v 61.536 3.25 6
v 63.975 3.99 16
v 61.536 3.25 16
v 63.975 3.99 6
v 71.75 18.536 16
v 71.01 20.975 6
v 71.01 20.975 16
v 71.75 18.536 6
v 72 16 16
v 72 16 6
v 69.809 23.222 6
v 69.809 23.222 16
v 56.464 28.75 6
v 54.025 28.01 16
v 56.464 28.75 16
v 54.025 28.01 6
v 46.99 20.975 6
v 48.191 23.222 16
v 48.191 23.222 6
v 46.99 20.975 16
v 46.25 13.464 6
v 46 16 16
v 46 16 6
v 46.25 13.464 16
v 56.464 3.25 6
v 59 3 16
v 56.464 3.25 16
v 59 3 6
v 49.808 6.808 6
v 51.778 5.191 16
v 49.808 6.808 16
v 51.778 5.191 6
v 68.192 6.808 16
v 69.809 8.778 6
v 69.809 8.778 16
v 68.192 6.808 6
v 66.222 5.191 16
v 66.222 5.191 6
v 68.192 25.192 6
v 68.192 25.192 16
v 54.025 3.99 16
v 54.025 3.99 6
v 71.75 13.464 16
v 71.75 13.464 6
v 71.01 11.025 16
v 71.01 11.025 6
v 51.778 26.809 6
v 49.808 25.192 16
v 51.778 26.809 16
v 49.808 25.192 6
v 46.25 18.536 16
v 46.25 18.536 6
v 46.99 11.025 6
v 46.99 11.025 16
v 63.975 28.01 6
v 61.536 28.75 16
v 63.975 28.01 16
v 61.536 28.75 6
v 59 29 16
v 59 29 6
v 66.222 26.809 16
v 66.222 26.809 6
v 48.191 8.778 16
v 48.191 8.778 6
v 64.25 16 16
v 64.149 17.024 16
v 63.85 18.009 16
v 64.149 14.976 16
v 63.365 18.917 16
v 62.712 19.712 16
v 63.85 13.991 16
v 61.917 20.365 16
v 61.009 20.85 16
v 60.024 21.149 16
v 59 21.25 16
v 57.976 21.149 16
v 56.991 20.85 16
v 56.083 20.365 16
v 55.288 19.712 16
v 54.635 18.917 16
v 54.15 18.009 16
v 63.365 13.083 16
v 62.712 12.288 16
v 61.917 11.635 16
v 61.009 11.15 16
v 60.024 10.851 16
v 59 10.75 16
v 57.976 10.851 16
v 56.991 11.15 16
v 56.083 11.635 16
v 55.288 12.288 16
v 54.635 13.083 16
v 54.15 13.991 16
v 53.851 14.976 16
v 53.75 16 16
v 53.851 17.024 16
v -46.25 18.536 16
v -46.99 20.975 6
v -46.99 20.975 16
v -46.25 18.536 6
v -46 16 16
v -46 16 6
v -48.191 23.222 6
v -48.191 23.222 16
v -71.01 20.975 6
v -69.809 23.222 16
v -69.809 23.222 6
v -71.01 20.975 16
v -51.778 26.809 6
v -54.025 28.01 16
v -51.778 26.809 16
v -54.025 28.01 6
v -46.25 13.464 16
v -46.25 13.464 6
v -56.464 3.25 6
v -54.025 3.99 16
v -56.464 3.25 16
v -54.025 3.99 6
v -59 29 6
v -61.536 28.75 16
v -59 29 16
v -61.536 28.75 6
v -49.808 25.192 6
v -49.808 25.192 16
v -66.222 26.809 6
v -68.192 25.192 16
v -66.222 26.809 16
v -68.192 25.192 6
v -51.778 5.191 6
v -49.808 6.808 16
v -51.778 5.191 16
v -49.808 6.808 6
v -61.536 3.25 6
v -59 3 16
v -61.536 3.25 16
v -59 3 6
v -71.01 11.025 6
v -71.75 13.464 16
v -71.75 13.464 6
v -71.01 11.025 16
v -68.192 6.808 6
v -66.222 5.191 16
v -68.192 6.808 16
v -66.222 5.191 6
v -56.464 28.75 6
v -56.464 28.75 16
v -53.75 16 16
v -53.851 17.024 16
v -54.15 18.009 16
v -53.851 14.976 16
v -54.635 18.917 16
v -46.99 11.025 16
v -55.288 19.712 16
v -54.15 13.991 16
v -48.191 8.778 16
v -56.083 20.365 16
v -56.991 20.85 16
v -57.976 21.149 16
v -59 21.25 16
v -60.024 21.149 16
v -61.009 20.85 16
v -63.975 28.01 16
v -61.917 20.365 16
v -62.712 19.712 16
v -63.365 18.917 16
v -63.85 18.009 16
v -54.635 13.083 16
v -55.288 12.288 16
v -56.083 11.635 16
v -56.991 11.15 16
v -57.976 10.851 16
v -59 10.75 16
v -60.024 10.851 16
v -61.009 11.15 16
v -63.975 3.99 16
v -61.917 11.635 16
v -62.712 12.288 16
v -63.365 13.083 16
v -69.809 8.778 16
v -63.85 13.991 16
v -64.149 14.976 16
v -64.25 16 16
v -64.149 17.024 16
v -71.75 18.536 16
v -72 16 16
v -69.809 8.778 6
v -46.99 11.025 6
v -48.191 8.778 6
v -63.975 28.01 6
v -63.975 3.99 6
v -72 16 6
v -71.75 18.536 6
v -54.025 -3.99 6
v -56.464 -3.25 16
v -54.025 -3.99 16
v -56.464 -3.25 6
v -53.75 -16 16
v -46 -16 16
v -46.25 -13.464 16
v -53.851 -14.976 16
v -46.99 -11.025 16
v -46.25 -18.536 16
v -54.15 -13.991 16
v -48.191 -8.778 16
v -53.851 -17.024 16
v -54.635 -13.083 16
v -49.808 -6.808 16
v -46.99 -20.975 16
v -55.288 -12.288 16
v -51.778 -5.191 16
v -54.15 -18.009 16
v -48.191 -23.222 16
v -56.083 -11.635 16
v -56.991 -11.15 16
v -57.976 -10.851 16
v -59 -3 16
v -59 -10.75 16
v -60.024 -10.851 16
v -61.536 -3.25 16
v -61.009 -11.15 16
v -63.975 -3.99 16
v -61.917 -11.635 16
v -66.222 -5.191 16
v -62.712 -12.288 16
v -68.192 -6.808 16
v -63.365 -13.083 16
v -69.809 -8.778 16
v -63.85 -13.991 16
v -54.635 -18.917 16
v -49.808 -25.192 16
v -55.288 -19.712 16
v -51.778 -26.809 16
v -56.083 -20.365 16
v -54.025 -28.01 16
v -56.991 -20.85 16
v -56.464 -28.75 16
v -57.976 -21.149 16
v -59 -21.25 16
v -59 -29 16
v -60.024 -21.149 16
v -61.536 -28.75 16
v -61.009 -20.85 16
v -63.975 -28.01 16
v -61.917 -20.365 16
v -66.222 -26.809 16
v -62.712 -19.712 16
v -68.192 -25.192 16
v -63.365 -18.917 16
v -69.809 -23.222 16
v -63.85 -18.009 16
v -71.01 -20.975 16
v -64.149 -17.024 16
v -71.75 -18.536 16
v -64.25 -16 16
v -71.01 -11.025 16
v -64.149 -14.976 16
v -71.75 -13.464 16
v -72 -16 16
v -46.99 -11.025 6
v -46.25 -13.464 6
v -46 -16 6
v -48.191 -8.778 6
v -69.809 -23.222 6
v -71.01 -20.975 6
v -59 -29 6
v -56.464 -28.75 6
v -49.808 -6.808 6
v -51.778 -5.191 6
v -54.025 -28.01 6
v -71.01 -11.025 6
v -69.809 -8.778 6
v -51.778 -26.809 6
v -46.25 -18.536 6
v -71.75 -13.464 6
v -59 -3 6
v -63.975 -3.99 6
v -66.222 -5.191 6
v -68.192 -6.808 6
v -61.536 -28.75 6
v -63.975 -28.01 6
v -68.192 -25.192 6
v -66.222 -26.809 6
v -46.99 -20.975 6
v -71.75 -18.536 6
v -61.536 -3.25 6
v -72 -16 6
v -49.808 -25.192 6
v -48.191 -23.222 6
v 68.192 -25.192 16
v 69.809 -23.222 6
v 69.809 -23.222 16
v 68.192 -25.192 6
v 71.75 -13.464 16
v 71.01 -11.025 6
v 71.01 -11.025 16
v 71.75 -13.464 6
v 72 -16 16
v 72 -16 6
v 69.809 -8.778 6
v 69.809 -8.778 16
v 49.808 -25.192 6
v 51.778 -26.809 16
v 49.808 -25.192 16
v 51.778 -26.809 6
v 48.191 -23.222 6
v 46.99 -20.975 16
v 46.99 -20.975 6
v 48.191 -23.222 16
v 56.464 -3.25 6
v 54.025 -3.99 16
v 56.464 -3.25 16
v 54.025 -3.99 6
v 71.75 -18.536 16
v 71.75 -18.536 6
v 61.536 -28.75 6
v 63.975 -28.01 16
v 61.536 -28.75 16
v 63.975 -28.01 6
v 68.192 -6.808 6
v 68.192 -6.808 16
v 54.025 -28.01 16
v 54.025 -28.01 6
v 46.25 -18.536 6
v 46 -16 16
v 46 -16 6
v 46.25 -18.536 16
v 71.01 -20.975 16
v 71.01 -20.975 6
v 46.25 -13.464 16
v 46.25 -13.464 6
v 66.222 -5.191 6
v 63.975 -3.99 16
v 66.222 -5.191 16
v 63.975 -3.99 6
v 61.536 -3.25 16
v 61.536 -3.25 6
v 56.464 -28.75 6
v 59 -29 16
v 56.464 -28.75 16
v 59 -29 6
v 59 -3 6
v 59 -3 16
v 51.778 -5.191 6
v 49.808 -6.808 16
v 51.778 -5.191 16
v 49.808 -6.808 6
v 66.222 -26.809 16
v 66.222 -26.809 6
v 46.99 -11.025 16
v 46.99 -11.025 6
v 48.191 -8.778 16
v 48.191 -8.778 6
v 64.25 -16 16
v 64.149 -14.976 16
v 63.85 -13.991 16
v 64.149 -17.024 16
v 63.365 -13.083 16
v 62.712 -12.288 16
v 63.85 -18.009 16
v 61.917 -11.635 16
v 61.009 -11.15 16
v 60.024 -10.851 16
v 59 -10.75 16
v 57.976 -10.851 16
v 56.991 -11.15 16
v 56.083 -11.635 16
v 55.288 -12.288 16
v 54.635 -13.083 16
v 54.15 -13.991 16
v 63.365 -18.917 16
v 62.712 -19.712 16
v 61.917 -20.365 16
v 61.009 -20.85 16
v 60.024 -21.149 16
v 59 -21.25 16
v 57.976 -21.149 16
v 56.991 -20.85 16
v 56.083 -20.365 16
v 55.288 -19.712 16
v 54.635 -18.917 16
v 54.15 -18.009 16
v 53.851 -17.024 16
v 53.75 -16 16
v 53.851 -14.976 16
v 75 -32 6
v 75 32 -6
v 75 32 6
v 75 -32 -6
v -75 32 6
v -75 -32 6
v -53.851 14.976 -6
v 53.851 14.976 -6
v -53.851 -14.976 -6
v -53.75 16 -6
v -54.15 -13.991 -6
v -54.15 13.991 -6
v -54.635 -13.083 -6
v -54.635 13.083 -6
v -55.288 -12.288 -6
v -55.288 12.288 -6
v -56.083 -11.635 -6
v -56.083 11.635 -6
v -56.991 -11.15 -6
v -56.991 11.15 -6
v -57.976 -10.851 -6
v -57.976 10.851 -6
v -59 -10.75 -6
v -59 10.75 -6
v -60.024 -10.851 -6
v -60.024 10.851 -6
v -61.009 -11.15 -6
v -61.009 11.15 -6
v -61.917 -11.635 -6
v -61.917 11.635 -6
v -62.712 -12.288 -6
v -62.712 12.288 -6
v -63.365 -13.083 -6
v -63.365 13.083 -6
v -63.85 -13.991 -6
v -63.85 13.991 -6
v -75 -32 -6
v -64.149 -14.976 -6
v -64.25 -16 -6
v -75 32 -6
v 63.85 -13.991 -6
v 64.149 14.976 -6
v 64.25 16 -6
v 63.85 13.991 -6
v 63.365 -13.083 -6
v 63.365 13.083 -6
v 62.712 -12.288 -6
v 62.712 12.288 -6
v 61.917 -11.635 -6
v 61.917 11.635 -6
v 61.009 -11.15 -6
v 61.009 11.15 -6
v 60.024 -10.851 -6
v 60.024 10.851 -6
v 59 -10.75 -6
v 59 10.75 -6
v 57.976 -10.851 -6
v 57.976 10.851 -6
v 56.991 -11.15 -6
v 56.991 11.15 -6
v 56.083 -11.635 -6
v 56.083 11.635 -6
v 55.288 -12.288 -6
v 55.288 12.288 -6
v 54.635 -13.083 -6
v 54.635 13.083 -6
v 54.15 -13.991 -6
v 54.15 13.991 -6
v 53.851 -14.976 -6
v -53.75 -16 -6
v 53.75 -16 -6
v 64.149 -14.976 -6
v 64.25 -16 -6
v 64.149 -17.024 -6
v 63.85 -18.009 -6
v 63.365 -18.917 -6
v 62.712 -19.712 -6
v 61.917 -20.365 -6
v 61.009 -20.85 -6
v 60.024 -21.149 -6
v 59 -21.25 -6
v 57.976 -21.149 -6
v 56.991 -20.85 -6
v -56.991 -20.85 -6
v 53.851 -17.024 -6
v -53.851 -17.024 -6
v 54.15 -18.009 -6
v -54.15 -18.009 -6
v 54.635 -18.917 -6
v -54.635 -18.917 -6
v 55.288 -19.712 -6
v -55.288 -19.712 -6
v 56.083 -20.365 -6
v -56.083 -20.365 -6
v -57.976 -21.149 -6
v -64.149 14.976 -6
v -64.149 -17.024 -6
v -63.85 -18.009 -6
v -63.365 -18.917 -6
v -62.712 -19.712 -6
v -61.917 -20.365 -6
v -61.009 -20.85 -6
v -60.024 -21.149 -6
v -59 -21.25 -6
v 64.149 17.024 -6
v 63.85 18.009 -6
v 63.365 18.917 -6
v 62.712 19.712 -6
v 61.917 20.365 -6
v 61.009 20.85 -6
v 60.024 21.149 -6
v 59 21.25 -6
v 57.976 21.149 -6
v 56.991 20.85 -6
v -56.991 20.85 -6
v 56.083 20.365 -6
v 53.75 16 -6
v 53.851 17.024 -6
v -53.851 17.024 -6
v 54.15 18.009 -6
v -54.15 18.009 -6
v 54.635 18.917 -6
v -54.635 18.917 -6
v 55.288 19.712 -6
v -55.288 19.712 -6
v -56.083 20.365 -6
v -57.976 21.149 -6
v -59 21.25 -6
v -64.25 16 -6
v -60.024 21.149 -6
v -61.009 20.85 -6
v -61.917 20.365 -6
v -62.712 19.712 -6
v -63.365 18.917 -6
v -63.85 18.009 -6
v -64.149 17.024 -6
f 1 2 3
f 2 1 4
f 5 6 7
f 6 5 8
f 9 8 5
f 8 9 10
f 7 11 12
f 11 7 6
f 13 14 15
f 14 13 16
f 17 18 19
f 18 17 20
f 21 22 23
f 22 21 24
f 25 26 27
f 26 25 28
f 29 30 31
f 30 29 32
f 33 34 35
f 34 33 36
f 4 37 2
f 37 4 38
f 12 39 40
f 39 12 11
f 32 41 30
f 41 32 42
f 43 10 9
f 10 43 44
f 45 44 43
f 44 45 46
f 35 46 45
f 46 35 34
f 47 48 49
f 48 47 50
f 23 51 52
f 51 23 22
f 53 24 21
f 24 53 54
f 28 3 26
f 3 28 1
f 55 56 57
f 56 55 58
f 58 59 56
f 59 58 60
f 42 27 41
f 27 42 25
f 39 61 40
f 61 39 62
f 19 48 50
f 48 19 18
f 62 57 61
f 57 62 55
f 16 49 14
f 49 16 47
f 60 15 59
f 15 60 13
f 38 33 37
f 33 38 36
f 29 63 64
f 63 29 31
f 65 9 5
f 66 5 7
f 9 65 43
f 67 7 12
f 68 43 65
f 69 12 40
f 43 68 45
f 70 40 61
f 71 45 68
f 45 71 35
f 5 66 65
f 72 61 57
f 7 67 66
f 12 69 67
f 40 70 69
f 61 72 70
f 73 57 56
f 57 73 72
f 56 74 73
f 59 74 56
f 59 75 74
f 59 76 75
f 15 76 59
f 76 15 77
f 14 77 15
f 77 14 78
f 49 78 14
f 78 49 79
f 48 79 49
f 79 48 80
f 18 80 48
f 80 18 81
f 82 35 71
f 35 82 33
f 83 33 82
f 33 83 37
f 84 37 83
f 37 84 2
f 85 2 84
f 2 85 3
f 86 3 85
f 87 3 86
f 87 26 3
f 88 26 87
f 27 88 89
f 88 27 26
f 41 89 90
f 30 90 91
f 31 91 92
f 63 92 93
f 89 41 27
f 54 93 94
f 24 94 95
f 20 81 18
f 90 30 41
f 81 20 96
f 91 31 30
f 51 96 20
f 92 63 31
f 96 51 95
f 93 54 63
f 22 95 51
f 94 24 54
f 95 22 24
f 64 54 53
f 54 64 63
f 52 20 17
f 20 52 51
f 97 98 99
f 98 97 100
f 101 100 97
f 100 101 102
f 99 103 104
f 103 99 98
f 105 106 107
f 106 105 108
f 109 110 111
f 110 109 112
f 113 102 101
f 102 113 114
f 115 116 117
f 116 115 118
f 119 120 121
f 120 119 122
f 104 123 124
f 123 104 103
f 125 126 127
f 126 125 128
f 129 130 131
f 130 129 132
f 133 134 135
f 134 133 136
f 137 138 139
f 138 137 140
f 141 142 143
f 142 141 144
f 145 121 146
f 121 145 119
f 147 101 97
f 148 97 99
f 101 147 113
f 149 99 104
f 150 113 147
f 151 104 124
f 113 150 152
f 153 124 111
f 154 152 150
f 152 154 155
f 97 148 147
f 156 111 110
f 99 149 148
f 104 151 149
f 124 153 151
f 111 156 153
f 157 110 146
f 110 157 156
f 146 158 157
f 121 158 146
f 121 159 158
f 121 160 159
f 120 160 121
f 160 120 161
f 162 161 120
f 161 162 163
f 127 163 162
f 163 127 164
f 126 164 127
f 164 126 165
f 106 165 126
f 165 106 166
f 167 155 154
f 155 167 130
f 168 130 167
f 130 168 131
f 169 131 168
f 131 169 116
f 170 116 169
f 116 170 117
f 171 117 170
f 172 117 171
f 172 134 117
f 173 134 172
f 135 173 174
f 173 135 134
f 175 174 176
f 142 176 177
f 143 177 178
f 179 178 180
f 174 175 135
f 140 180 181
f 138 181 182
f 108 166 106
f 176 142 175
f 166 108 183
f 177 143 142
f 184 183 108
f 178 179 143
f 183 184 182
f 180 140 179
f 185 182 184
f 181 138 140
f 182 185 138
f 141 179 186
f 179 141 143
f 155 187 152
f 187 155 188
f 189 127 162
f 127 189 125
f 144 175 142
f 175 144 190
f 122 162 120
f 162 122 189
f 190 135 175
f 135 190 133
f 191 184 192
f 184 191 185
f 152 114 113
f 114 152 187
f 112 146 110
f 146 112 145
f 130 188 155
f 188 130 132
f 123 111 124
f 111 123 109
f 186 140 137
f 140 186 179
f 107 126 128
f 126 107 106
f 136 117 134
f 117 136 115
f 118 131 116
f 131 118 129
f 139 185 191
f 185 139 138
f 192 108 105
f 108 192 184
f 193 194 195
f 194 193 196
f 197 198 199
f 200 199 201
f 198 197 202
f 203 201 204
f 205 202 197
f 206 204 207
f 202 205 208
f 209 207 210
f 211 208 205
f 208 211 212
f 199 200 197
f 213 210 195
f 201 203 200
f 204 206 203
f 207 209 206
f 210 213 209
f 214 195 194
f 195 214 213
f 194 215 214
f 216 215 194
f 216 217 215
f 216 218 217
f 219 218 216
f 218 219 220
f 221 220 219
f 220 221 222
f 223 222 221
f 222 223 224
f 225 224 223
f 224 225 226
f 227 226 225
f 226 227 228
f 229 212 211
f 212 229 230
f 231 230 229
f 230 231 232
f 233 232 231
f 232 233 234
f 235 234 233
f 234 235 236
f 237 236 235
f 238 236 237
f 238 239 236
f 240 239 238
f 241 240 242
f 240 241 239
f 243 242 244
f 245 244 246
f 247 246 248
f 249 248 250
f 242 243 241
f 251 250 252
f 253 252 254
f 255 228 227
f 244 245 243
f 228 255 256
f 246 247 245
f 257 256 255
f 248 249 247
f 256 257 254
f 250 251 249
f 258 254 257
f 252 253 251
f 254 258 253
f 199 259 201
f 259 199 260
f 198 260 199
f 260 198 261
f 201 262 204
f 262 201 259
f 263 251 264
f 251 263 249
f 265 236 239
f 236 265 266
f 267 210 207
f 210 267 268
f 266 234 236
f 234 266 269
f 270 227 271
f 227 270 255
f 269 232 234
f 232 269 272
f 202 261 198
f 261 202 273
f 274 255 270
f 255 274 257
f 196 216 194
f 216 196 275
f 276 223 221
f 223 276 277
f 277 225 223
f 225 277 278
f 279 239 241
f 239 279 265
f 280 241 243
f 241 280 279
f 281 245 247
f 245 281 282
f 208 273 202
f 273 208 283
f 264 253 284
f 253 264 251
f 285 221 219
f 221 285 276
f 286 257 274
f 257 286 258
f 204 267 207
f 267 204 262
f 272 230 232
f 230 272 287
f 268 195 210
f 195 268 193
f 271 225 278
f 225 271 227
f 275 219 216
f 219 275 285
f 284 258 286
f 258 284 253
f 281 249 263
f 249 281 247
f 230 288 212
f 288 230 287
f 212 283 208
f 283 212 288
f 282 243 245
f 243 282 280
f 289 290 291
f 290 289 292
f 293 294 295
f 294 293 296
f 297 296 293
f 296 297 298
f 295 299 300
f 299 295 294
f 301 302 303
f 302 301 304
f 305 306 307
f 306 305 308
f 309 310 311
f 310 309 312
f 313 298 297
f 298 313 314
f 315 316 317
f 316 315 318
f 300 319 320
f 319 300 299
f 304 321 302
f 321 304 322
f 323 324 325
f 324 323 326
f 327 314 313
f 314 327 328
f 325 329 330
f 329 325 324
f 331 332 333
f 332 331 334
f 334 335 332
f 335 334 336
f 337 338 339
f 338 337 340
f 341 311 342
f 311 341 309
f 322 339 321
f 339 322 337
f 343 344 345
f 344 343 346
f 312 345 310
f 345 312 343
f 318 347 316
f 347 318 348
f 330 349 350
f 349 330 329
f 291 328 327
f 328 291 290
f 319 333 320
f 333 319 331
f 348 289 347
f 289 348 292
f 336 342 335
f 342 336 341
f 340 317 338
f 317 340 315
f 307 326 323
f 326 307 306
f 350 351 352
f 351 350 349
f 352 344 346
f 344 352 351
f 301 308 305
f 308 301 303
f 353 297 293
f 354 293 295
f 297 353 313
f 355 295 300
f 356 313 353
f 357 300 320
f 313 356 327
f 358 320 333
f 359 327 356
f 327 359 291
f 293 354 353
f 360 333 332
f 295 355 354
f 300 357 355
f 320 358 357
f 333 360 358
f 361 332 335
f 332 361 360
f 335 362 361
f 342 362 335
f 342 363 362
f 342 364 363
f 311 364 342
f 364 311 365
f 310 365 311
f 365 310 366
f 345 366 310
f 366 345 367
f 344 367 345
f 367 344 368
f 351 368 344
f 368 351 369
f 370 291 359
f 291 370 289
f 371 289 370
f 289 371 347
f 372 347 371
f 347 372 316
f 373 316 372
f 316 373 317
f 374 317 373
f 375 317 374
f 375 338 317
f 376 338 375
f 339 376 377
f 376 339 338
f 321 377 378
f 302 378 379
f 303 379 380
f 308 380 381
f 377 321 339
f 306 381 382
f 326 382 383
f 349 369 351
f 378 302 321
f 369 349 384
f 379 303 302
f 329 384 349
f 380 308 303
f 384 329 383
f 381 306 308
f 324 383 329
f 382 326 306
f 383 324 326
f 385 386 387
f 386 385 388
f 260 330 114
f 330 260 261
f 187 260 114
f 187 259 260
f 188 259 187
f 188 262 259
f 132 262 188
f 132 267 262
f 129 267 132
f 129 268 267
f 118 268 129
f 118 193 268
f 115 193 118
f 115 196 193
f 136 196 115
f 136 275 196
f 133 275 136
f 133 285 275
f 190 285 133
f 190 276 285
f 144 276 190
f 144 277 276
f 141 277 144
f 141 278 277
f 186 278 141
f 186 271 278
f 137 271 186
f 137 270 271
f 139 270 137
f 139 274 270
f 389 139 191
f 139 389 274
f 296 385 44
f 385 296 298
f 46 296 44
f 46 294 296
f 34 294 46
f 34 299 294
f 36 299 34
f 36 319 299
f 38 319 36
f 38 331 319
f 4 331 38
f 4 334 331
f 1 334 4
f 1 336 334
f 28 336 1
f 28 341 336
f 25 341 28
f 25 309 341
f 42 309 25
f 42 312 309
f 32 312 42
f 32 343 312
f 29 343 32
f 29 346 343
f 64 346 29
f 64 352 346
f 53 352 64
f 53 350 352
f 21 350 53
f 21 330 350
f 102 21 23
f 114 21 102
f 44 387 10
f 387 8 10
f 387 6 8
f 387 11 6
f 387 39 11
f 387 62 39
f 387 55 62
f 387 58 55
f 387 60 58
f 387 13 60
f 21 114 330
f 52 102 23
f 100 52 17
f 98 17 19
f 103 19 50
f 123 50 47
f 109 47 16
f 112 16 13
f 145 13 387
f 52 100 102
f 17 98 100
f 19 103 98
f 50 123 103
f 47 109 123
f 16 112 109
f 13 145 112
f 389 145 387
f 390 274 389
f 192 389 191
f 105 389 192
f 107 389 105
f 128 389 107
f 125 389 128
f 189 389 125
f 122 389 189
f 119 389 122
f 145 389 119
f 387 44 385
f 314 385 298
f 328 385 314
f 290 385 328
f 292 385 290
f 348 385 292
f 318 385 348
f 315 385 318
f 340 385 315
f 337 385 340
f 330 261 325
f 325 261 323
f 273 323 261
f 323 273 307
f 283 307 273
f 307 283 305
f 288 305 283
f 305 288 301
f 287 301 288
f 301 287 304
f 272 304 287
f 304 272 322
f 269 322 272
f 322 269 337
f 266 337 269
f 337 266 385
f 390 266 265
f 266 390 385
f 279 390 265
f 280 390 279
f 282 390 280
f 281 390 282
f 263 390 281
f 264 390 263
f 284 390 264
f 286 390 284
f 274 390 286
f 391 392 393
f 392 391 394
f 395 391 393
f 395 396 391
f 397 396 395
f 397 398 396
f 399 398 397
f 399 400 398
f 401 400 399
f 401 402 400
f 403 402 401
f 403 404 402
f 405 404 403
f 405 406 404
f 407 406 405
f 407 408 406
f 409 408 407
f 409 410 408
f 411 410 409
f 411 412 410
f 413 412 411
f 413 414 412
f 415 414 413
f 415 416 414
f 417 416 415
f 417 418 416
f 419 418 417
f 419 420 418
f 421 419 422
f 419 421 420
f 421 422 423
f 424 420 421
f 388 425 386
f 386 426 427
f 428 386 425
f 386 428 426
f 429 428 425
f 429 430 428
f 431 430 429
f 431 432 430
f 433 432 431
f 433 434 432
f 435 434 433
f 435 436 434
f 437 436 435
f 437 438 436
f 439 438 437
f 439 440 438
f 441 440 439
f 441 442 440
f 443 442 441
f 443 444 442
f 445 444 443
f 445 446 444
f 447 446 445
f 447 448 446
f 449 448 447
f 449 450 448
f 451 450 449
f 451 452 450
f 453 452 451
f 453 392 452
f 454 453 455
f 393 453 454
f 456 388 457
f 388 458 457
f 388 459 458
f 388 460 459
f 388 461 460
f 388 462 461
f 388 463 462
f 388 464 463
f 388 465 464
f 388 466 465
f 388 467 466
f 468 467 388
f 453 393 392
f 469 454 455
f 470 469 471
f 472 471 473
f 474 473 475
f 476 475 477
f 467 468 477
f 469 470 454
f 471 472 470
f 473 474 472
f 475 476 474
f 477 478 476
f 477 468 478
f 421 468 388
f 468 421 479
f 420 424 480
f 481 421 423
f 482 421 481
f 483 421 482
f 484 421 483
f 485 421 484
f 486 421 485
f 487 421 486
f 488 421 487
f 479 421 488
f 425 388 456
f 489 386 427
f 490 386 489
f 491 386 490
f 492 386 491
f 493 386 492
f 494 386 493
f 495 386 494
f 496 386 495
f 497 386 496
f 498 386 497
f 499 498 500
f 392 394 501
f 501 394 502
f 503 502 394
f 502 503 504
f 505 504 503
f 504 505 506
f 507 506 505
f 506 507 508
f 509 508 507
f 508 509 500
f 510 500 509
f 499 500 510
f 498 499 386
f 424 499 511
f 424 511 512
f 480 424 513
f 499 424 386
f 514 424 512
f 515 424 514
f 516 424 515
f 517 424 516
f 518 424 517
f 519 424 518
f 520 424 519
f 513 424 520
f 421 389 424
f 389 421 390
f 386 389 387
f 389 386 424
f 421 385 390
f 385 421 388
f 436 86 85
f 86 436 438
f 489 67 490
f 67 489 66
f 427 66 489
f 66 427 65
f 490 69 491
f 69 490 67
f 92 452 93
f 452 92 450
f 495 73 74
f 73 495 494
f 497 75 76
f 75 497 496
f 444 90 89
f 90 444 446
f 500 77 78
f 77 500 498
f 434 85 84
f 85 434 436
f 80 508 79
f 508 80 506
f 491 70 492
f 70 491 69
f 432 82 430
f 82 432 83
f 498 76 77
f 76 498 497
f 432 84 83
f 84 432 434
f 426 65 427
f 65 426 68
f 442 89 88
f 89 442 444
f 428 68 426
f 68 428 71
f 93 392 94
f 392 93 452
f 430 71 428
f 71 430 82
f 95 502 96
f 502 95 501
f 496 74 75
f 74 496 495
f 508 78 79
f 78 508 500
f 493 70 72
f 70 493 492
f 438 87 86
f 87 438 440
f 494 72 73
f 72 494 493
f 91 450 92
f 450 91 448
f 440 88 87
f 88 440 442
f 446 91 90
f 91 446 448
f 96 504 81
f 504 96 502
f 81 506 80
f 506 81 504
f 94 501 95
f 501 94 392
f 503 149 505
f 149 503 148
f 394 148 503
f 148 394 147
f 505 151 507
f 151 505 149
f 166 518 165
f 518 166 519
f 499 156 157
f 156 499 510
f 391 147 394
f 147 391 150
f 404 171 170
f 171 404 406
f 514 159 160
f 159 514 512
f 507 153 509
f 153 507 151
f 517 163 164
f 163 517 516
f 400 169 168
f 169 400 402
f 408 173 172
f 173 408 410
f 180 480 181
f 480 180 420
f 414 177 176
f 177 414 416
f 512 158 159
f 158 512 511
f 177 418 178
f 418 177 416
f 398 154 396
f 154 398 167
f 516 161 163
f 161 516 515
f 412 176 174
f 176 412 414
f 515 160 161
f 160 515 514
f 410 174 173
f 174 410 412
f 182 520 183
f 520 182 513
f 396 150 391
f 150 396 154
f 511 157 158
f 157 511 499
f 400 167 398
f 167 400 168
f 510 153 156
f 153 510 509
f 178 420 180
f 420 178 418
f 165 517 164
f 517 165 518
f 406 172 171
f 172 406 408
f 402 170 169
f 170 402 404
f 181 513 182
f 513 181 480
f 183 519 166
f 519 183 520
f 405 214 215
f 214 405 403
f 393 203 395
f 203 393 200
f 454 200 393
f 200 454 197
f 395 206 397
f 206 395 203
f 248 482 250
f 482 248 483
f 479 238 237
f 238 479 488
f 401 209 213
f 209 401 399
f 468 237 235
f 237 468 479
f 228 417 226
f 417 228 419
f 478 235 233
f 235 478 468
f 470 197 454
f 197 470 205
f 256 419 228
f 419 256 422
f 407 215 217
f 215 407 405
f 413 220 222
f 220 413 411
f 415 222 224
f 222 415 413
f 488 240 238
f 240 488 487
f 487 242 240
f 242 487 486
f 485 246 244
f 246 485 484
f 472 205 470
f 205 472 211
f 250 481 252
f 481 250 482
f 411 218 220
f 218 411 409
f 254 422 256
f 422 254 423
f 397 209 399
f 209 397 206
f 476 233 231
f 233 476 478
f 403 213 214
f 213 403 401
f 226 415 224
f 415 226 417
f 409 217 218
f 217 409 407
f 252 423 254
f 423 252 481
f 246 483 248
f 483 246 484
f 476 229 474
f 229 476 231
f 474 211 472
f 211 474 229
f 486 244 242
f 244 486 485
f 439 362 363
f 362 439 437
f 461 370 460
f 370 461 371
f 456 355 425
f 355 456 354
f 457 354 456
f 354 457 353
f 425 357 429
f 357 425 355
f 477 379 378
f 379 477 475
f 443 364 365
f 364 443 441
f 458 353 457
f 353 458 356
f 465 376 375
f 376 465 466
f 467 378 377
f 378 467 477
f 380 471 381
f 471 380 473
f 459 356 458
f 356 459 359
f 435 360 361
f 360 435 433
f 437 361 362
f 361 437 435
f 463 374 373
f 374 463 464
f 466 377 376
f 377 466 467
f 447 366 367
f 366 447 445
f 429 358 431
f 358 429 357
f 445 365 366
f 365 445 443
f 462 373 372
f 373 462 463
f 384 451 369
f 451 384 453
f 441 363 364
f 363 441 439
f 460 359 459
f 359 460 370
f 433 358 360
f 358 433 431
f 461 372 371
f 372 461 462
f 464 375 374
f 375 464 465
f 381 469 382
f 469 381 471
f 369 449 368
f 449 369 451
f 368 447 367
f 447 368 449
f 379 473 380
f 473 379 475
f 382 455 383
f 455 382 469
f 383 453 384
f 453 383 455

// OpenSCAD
$fn = 32;

// ----------------------------------------------------------------------
// Anchor pads 150 x 64 x 22
// four corner bosses with anchor holes
// ----------------------------------------------------------------------

// --- parameters (mm) ---
plate = [150, 64, 12];  // base plate size (x, y, z)
pads = 4;               // boss count, one per corner
edge = 16;              // boss centre offset from the plate edge
boss_d = 26;            // boss diameter
boss_h = 10;            // boss height above the base plate
hole_d = 10.5;          // hole diameter

// --- derived feature positions (mm) ---
height = plate[2] + boss_h;      // = 22   overall height of the part
corner_x = plate[0] / 2 - edge;  // = 59   boss centre X
corner_y = plate[1] / 2 - edge;  // = 16   boss centre Y
feature_centers = [
  [corner_x, corner_y],
  [-corner_x, corner_y],
  [-corner_x, -corner_y],
  [corner_x, -corner_y]
];   // boss centres, anchor holes are drilled there

// base plate, four bosses standing on it, anchor holes all the way through
difference() {
  union() {
    cube(plate, center = true);
    for (centre = feature_centers)
      translate([centre[0], centre[1], plate[2] / 2 - 1])
        cylinder(d = boss_d, h = boss_h + 1);
  }
  for (centre = feature_centers)
    translate([centre[0], centre[1], -height])
      cylinder(d = hole_d, h = 2 * height + 2);  // through boss and plate
}
